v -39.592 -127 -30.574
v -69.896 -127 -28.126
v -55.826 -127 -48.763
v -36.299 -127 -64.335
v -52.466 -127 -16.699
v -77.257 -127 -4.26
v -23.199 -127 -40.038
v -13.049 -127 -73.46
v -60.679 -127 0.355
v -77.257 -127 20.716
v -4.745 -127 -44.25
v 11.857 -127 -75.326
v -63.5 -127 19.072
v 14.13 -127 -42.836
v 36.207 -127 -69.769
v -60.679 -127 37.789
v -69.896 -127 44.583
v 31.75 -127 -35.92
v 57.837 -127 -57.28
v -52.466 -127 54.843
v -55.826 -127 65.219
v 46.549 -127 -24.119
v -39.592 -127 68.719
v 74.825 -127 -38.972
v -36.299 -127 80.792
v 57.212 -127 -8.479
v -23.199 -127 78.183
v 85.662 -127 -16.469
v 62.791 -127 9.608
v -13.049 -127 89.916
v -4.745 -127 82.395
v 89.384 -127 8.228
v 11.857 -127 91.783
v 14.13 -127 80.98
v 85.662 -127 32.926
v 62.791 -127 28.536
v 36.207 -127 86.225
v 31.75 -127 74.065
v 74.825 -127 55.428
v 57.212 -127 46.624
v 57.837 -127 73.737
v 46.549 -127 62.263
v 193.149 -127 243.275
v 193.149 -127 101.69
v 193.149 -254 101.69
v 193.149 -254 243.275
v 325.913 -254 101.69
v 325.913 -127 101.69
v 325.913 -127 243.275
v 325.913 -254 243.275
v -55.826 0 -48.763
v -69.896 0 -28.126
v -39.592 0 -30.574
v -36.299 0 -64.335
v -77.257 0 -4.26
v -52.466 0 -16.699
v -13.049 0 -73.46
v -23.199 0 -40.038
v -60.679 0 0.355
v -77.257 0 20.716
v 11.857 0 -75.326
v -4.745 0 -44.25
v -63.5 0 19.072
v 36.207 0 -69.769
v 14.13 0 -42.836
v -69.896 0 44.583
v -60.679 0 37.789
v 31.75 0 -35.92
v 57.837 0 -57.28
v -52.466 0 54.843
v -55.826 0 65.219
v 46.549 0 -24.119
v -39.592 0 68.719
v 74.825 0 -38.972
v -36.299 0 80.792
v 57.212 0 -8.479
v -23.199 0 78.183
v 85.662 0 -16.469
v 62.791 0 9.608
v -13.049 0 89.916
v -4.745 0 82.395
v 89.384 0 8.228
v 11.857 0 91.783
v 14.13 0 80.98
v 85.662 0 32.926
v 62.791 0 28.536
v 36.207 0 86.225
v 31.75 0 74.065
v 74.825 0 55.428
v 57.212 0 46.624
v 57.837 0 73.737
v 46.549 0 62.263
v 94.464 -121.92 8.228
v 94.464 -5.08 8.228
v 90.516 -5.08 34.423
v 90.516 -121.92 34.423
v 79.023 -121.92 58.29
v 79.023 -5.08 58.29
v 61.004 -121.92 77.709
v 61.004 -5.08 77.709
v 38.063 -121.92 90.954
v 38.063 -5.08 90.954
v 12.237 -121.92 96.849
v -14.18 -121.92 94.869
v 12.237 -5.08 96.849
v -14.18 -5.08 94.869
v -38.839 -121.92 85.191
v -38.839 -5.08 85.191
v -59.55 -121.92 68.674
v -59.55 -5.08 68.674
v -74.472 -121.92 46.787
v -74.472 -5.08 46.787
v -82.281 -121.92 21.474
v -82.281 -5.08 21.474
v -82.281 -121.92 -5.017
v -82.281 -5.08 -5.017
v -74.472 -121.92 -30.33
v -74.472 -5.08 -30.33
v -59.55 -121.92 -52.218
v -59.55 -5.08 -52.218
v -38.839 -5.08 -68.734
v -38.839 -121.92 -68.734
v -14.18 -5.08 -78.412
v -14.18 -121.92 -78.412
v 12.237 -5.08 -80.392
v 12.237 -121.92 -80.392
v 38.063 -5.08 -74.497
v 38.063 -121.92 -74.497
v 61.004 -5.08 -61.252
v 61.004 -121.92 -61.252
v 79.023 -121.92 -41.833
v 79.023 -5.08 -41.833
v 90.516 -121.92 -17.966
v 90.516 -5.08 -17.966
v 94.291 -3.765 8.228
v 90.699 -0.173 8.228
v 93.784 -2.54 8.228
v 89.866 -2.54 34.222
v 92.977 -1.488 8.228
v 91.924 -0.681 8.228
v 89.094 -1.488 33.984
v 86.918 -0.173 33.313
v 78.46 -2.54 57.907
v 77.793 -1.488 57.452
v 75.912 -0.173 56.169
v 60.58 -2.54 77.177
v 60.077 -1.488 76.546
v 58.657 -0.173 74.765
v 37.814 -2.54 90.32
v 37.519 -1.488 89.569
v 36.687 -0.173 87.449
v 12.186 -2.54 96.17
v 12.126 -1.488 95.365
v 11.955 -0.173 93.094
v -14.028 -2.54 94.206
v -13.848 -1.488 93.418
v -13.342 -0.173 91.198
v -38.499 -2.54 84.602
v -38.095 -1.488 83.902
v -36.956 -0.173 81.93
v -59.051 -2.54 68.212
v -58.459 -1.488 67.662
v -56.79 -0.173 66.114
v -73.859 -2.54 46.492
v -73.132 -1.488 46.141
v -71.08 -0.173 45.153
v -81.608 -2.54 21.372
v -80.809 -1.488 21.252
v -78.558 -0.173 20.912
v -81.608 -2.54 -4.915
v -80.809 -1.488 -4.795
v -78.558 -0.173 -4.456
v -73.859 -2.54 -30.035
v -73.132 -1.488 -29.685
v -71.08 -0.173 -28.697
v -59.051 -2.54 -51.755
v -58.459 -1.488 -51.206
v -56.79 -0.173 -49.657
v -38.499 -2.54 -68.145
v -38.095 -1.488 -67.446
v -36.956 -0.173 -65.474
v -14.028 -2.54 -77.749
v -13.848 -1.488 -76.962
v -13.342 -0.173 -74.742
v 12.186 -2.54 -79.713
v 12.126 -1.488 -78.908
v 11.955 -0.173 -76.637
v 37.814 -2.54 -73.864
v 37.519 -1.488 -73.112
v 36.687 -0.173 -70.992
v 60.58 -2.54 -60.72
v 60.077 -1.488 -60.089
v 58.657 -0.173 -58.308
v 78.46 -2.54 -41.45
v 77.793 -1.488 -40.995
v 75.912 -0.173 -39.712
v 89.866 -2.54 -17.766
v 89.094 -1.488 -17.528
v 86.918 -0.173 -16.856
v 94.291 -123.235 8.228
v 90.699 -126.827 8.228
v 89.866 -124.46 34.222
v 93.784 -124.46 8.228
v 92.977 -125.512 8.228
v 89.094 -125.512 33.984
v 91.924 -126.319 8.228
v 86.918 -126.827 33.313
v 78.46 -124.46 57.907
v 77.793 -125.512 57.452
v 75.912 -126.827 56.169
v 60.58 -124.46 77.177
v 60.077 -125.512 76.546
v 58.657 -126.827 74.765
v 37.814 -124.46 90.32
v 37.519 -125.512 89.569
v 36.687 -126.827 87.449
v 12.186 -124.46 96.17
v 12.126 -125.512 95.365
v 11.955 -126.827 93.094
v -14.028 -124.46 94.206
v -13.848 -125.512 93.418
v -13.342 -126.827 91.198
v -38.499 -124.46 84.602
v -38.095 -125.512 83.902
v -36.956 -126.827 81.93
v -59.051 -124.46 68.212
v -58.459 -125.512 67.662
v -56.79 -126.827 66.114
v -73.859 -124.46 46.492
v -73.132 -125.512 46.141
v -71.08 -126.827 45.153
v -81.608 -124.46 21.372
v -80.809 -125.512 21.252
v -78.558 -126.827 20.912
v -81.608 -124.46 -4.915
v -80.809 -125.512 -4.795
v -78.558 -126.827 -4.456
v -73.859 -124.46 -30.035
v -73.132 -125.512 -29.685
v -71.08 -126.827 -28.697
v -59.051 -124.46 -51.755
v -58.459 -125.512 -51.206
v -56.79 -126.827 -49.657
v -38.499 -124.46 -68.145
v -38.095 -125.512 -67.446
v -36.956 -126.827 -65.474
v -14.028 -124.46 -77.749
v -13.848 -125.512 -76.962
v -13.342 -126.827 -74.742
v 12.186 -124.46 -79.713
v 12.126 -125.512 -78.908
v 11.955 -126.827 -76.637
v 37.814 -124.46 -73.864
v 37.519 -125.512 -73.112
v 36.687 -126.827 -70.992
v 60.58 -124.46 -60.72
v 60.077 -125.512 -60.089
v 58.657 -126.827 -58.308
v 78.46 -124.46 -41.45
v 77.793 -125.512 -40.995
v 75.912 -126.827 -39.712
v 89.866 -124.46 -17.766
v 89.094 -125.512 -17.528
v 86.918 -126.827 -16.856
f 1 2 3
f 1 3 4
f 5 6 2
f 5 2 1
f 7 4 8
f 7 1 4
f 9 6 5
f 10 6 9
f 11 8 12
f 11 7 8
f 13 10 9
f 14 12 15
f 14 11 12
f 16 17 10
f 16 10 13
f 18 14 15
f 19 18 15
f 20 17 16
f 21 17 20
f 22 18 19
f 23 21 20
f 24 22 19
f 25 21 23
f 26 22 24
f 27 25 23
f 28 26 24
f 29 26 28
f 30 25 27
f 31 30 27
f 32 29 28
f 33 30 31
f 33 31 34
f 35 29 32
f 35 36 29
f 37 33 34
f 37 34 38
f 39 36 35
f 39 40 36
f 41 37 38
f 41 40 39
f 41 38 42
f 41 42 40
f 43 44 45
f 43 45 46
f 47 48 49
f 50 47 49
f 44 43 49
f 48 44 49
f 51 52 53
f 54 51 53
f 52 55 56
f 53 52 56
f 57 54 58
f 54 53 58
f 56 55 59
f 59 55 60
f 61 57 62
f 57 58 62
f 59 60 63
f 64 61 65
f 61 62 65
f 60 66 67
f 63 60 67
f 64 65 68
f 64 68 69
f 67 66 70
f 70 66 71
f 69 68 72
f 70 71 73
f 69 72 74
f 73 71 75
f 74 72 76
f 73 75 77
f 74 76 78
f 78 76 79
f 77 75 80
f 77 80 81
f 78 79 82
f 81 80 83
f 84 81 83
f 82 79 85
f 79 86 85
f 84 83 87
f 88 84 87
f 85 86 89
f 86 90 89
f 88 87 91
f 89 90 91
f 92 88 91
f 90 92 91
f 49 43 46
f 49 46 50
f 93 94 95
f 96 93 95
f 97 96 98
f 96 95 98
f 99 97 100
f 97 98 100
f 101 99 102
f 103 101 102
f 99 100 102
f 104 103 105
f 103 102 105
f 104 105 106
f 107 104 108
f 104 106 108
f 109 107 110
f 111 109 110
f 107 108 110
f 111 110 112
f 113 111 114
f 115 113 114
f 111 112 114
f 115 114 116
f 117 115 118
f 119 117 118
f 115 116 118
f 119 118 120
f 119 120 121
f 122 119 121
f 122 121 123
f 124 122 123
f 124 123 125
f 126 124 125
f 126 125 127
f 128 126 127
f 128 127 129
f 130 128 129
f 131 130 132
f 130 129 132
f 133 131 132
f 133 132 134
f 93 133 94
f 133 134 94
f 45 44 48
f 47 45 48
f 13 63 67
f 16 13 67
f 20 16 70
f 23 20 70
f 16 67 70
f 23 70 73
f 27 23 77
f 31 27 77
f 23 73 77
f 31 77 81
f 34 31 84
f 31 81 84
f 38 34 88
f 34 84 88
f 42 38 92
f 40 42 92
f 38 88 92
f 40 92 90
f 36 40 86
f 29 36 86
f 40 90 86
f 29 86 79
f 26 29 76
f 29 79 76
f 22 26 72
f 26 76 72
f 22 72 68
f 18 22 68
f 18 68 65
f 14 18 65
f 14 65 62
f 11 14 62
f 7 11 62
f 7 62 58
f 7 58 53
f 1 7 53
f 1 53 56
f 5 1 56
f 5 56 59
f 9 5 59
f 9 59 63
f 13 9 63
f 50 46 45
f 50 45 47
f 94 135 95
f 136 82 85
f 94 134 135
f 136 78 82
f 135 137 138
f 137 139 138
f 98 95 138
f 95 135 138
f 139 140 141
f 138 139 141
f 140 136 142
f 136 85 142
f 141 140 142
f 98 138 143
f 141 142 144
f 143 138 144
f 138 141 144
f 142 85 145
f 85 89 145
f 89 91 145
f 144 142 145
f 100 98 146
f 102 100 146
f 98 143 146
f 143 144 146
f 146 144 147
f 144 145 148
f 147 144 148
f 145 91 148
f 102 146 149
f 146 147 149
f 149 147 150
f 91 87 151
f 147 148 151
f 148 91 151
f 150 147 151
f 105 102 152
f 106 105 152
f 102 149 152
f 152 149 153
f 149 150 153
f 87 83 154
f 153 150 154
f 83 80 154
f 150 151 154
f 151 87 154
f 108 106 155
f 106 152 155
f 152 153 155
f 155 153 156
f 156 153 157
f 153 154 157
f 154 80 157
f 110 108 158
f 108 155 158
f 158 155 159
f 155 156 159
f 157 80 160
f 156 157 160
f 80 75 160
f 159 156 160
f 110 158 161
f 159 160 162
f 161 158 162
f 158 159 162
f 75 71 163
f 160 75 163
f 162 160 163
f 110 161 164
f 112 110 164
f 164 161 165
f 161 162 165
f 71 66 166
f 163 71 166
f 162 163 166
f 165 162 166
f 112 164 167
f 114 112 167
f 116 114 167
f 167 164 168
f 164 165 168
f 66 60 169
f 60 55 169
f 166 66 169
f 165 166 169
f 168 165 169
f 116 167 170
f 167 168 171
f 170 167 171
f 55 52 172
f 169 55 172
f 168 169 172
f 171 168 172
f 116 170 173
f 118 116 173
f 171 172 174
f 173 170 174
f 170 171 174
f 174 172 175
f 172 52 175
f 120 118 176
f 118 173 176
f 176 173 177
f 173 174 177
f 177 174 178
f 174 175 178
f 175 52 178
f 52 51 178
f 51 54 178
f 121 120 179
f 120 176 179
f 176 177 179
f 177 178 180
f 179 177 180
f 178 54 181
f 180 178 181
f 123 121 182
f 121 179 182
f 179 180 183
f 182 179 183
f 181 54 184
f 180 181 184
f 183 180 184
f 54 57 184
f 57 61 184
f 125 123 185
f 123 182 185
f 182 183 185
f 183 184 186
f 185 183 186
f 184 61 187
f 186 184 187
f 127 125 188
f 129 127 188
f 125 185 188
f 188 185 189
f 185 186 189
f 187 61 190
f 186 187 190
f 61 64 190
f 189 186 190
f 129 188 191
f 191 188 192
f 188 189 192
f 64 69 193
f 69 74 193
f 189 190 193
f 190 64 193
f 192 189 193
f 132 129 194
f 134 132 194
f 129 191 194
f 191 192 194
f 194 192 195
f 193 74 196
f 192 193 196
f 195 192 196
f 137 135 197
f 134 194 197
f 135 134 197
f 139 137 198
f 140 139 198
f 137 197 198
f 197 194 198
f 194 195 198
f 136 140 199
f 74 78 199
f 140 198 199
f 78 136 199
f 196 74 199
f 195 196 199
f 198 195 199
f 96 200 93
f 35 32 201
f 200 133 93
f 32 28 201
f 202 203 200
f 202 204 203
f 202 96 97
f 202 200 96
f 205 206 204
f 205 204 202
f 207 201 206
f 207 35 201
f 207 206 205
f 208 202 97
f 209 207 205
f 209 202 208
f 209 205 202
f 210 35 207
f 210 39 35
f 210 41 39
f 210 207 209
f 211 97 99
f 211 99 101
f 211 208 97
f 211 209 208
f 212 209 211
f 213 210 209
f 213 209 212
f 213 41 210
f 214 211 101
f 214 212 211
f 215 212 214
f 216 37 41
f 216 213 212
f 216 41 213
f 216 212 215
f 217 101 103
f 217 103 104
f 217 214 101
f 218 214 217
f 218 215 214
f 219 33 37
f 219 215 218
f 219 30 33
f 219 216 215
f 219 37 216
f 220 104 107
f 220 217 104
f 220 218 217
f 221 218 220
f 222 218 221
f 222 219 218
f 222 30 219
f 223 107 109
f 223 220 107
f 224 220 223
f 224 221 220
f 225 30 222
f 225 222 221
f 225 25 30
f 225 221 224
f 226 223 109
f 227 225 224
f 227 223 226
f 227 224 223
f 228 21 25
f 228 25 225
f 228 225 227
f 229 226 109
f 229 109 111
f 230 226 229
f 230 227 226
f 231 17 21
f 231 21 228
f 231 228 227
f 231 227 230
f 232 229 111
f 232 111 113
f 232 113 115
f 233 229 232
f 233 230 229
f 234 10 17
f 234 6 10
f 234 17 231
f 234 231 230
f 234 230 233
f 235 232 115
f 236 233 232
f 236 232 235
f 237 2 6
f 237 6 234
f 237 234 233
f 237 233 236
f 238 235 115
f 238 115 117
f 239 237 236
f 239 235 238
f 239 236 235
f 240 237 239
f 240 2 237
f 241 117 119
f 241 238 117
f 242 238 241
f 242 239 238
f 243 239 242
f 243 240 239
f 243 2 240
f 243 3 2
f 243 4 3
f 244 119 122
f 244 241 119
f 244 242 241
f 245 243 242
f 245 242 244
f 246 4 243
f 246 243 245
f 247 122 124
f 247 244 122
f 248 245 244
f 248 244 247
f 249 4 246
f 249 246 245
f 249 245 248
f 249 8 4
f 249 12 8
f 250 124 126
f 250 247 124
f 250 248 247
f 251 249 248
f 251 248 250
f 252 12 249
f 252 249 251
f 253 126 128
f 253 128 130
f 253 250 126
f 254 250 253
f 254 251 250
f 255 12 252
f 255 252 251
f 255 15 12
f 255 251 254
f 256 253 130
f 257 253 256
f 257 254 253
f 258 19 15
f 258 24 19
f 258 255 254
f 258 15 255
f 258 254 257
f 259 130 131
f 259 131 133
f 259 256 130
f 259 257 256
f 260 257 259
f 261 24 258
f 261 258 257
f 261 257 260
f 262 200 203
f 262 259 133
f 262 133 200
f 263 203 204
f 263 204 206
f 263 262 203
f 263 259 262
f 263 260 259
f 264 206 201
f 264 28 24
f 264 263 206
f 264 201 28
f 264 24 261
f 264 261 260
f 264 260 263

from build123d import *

# Parameters (mm, degrees)
F0_R     = 88.86888
F1_DEPTH = 127
F2_R     = 5.08
F4_D     = 127
F5_W     = 132.764369
F5_H     = 141.584768
F6_DEPTH = 127


with BuildPart() as f1:
    # F0 (on Front) → F1 (new body)
    with BuildSketch(Plane.XZ):
        with Locations((5.595607, 8.228303)):
            Circle(F0_R)
    extrude(amount=F1_DEPTH)

    # F2
    f2_edges = [f1.edges().sort_by_distance(p)[0] for p in [
        (-83.273273, -127, 8.228303),
        (94.464488, -63.5, 8.228303),
        (-83.273273, 0, 8.228303),
    ]]
    fillet(f2_edges, radius=F2_R)

    # F4 (through all)
    with Locations(Plane.XZ.offset(127)):
        with Locations((0, 19.072302)):
            Hole(F4_D / 2)


with BuildPart() as f6:
    # F5 (on face) → F6 (new body)
    with BuildSketch(Plane.XZ.offset(127)):
        with Locations((259.530827, 172.482647)):
            Rectangle(F5_W, F5_H)
    extrude(amount=F6_DEPTH)


solid = Compound([f1.part, f6.part])
